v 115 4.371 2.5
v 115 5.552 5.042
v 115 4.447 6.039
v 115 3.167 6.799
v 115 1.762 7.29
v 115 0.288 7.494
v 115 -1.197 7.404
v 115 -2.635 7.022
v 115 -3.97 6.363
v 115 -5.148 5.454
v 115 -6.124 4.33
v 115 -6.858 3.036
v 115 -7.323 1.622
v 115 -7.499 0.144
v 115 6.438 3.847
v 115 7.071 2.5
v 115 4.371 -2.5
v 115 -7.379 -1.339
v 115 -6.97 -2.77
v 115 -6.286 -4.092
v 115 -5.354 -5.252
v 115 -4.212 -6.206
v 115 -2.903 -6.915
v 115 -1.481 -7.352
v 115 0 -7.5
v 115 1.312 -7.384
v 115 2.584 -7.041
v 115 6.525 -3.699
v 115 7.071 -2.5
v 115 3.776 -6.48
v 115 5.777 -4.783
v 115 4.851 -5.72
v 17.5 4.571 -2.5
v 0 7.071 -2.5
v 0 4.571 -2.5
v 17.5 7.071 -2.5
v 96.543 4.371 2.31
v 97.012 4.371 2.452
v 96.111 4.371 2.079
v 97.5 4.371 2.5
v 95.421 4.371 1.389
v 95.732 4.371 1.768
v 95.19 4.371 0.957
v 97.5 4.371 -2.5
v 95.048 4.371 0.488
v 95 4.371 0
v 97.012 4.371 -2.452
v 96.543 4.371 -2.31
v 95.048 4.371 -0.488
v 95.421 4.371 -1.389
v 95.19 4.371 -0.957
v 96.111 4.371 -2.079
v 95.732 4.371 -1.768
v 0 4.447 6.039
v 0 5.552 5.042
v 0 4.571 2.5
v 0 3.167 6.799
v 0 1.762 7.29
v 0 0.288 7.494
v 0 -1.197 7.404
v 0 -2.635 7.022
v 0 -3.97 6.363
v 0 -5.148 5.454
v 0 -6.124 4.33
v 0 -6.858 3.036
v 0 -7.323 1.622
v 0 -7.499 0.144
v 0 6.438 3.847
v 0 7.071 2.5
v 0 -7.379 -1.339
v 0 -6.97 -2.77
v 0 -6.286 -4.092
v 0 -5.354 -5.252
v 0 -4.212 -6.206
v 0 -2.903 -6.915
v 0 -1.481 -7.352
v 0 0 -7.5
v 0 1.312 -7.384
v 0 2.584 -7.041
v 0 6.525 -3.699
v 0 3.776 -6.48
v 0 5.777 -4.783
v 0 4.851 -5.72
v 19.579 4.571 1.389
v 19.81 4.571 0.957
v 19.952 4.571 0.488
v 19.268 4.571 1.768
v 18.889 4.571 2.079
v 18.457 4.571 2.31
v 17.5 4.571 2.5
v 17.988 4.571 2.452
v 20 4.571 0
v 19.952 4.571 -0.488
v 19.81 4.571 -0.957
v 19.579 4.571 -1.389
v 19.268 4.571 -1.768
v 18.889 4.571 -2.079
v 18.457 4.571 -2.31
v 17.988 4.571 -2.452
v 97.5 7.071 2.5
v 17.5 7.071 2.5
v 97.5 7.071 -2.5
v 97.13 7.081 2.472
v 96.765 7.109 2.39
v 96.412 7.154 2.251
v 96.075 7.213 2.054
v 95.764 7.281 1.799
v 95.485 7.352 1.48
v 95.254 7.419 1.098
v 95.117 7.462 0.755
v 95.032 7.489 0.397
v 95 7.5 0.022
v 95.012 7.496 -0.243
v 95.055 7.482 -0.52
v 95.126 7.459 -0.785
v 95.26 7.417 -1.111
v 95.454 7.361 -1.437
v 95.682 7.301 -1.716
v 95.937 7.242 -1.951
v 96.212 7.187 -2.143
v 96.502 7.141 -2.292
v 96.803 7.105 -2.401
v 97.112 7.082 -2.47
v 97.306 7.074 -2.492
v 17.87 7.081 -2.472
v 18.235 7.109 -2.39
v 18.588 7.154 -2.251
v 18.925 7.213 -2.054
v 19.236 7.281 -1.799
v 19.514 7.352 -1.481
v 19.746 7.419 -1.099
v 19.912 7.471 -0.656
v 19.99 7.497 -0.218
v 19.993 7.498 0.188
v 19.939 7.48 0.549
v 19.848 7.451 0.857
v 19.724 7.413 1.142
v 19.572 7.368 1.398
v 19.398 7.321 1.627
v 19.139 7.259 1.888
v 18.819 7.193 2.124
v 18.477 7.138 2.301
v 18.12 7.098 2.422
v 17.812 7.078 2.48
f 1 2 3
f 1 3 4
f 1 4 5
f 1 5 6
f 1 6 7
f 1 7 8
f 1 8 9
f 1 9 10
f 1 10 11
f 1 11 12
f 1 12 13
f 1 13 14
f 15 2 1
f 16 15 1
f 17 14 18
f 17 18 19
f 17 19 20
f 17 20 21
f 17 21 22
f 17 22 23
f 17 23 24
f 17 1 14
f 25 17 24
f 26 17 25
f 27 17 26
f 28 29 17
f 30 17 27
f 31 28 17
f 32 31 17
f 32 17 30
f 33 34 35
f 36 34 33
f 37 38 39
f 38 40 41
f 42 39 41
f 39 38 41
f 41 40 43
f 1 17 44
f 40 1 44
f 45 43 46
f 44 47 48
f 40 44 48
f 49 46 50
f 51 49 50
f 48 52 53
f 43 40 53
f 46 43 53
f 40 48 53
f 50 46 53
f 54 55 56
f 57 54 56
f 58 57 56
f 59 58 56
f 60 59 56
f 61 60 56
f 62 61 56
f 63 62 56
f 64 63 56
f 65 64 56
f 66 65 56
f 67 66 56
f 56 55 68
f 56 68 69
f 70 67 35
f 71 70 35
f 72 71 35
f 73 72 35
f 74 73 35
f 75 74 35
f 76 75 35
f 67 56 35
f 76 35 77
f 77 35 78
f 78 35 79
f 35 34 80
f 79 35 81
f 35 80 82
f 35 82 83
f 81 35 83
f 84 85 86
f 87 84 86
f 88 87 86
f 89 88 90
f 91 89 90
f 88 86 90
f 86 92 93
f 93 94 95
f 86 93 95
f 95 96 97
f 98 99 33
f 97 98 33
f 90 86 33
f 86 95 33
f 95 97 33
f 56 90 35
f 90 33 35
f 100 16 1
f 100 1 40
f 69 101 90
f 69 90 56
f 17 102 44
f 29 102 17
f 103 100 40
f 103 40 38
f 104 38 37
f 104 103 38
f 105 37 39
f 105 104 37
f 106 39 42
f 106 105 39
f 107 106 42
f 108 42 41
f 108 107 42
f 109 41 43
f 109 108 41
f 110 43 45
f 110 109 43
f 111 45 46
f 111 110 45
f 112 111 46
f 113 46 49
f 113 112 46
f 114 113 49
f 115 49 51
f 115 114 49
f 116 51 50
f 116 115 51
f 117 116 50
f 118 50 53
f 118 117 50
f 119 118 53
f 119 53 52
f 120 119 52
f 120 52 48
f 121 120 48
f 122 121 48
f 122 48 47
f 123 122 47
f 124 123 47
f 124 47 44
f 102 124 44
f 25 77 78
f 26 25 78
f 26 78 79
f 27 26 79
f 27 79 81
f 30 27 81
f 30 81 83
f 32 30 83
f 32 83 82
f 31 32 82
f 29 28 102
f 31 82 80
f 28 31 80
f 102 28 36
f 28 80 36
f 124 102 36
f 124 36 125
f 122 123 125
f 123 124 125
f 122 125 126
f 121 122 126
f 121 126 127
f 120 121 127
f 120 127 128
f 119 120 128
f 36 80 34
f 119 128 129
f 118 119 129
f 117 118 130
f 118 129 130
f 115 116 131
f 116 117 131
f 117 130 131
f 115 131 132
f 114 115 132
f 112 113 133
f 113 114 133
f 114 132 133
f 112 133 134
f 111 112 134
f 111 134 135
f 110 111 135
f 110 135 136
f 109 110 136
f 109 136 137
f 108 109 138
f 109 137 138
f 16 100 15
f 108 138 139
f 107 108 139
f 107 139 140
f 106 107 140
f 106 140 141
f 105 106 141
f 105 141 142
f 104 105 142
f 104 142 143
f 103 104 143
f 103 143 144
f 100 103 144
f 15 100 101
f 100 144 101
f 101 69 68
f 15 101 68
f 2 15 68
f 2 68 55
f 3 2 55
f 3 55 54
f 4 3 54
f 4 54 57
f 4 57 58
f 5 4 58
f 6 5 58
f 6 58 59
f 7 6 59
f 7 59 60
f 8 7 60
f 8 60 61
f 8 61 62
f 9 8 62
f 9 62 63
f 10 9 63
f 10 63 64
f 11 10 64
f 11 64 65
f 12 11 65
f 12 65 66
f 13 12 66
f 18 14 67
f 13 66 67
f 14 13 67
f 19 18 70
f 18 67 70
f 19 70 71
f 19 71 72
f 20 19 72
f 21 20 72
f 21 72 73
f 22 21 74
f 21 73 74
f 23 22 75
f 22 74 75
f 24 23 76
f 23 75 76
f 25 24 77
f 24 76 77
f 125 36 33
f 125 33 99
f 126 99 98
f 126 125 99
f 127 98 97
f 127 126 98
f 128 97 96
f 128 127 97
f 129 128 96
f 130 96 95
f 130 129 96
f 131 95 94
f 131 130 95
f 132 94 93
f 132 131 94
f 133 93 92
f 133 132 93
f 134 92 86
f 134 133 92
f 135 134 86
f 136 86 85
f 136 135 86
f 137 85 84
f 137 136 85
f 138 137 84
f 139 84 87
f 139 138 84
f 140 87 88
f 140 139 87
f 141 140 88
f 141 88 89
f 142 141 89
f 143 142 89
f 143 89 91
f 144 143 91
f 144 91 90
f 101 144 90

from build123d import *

# Parameters (mm, degrees)
SKETCH1_R           = 7.5
BOSS_EXTRUDE1_DEPTH = 115
CUT_EXTRUDE3_START  = 10
CUT_EXTRUDE3_DEPTH  = 12.5
CUT_EXTRUDE4_START  = 10
CUT_EXTRUDE4_DEPTH  = 12.7


with BuildPart() as part:
    # Sketch1 → Boss-Extrude1 (new body)
    with BuildSketch(Plane(origin=(0, 0, 0), x_dir=(0, 0, -1), z_dir=(1, 0, 0))):
        Circle(SKETCH1_R)
    extrude(amount=BOSS_EXTRUDE1_DEPTH)

    # Sketch8 → Cut-Extrude3 (cut)
    with BuildSketch(Plane(origin=(0, 7.071067812, 0), x_dir=(1, 0, 0), z_dir=(0, 1, 0)).offset(CUT_EXTRUDE3_START)):
        with BuildLine():
            Line((0, 2.5), (17.5, 2.5))
            ThreePointArc((17.5, 2.5), (20, 0), (17.5, -2.5))
            Line((17.5, -2.5), (0, -2.5))
            ThreePointArc((0, -2.5), (-2.5, 0), (0, 2.5))
        make_face()
    extrude(amount=-CUT_EXTRUDE3_DEPTH, mode=Mode.SUBTRACT)

    # Sketch9 → Cut-Extrude4 (cut)
    with BuildSketch(Plane(origin=(0, 7.071067812, 0), x_dir=(1, 0, 0), z_dir=(0, 1, 0)).offset(CUT_EXTRUDE4_START)):
        with BuildLine():
            Line((115, -2.5), (97.5, -2.5))
            ThreePointArc((97.5, -2.5), (95, 0), (97.5, 2.5))
            Line((97.5, 2.5), (115, 2.5))
            ThreePointArc((115, 2.5), (117.5, 0), (115, -2.5))
        make_face()
    extrude(amount=-CUT_EXTRUDE4_DEPTH, mode=Mode.SUBTRACT)


solid = part.part
